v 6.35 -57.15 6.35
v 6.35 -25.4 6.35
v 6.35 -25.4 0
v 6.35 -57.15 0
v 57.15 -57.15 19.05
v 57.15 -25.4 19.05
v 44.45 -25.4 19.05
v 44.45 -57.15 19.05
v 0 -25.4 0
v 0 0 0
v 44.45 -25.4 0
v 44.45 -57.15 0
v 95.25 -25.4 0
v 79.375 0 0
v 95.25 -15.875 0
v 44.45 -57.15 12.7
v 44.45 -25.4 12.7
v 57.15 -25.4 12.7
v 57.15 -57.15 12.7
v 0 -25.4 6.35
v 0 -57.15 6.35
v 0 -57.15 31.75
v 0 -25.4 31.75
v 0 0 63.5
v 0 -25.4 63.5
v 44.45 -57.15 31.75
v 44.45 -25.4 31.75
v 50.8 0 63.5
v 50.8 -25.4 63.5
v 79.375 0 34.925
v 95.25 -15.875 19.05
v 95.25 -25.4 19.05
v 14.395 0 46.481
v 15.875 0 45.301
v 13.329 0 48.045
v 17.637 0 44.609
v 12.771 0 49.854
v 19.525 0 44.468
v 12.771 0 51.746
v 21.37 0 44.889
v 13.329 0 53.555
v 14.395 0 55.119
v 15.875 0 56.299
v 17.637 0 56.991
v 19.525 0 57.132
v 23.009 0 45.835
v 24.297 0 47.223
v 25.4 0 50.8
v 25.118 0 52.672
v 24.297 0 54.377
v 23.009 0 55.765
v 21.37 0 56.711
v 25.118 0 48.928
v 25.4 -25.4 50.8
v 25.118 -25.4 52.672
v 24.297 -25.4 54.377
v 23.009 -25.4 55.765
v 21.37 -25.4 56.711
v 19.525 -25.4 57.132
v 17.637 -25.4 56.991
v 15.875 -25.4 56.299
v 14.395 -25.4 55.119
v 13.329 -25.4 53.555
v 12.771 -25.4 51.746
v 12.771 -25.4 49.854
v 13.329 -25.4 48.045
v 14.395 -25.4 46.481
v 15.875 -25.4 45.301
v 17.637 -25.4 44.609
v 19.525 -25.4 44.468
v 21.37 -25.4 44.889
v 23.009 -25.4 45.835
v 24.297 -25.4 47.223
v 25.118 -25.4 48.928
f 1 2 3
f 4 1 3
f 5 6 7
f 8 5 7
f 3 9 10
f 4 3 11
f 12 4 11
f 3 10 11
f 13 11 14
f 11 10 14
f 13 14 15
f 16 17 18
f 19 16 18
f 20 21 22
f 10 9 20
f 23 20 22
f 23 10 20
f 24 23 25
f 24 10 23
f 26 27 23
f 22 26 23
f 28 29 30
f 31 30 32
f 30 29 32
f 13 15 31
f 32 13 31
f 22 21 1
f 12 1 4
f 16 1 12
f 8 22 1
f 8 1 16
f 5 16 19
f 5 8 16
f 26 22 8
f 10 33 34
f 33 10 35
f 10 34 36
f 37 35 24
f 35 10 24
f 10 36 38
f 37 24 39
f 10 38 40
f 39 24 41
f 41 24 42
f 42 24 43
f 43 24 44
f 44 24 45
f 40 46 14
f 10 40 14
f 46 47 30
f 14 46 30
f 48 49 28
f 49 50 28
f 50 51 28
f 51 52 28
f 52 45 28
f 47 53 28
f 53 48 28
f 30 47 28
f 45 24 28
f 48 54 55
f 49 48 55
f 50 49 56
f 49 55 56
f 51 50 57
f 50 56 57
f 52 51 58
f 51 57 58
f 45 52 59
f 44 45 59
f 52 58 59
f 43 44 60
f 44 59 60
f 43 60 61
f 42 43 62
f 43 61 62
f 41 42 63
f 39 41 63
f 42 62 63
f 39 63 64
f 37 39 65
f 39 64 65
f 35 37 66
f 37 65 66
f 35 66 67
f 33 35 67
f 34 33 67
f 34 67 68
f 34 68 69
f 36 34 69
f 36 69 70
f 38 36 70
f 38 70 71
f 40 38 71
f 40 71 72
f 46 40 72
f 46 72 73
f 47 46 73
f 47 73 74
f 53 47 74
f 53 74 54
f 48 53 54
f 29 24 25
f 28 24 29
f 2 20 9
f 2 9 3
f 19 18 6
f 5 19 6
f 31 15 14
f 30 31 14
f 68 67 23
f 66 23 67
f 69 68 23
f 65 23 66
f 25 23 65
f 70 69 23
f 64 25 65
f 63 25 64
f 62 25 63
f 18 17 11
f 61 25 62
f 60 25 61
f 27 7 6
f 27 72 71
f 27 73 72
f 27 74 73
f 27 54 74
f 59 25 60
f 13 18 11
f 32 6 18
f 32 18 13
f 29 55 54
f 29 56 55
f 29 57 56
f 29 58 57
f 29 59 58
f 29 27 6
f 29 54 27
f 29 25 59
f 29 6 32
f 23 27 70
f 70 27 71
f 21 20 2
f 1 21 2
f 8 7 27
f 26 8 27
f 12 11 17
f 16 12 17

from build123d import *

# Parameters (mm, degrees)
F0_W     = 95.25
F0_H     = 63.5
F1_DEPTH = 25.4
F3_DEPTH = 25.401
F5_DEPTH = 63.501
F6_R     = 6.35
F7_DEPTH = 25.401
F9_DEPTH = 31.75


with BuildPart() as f1:
    # F0 (on Front) → F1 (new body)
    with BuildSketch(Plane.XZ):
        with Locations((47.625, 31.75)):
            Rectangle(F0_W, F0_H)
    extrude(amount=F1_DEPTH)

    # F2 (on face) → F3 (cut, through all)
    with BuildSketch(Plane.XZ.offset(25.4)):
        Polygon((95.25, 63.5), (50.8, 63.5), (95.25, 19.05), align=None)
    extrude(amount=-F3_DEPTH, mode=Mode.SUBTRACT)

    # F4 (on face) → F5 (cut, through all)
    with BuildSketch(Plane(origin=(0, 0, 0), x_dir=(1, 0, 0), z_dir=(0, 0, -1))):
        Polygon((95.25, 0), (95.25, 15.875), (79.375, 0), align=None)
    extrude(amount=-F5_DEPTH, mode=Mode.SUBTRACT)

    # F6 (on face) → F7 (cut, through all)
    with BuildSketch(Plane.XZ.offset(25.4)):
        with Locations((19.05, 50.8)):
            Circle(F6_R)
    extrude(amount=-F7_DEPTH, mode=Mode.SUBTRACT)

    # F8 (on face) → F9 (join)
    with BuildSketch(Plane.XZ.offset(25.4)):
        Polygon((0, 31.75), (0, 6.35), (6.35, 6.35), (6.35, 0), (44.45, 0), (44.45, 12.7), (57.15, 12.7), (57.15, 19.05), (44.45, 19.05), (44.45, 31.75), align=None)
    extrude(amount=F9_DEPTH)


solid = f1.part
